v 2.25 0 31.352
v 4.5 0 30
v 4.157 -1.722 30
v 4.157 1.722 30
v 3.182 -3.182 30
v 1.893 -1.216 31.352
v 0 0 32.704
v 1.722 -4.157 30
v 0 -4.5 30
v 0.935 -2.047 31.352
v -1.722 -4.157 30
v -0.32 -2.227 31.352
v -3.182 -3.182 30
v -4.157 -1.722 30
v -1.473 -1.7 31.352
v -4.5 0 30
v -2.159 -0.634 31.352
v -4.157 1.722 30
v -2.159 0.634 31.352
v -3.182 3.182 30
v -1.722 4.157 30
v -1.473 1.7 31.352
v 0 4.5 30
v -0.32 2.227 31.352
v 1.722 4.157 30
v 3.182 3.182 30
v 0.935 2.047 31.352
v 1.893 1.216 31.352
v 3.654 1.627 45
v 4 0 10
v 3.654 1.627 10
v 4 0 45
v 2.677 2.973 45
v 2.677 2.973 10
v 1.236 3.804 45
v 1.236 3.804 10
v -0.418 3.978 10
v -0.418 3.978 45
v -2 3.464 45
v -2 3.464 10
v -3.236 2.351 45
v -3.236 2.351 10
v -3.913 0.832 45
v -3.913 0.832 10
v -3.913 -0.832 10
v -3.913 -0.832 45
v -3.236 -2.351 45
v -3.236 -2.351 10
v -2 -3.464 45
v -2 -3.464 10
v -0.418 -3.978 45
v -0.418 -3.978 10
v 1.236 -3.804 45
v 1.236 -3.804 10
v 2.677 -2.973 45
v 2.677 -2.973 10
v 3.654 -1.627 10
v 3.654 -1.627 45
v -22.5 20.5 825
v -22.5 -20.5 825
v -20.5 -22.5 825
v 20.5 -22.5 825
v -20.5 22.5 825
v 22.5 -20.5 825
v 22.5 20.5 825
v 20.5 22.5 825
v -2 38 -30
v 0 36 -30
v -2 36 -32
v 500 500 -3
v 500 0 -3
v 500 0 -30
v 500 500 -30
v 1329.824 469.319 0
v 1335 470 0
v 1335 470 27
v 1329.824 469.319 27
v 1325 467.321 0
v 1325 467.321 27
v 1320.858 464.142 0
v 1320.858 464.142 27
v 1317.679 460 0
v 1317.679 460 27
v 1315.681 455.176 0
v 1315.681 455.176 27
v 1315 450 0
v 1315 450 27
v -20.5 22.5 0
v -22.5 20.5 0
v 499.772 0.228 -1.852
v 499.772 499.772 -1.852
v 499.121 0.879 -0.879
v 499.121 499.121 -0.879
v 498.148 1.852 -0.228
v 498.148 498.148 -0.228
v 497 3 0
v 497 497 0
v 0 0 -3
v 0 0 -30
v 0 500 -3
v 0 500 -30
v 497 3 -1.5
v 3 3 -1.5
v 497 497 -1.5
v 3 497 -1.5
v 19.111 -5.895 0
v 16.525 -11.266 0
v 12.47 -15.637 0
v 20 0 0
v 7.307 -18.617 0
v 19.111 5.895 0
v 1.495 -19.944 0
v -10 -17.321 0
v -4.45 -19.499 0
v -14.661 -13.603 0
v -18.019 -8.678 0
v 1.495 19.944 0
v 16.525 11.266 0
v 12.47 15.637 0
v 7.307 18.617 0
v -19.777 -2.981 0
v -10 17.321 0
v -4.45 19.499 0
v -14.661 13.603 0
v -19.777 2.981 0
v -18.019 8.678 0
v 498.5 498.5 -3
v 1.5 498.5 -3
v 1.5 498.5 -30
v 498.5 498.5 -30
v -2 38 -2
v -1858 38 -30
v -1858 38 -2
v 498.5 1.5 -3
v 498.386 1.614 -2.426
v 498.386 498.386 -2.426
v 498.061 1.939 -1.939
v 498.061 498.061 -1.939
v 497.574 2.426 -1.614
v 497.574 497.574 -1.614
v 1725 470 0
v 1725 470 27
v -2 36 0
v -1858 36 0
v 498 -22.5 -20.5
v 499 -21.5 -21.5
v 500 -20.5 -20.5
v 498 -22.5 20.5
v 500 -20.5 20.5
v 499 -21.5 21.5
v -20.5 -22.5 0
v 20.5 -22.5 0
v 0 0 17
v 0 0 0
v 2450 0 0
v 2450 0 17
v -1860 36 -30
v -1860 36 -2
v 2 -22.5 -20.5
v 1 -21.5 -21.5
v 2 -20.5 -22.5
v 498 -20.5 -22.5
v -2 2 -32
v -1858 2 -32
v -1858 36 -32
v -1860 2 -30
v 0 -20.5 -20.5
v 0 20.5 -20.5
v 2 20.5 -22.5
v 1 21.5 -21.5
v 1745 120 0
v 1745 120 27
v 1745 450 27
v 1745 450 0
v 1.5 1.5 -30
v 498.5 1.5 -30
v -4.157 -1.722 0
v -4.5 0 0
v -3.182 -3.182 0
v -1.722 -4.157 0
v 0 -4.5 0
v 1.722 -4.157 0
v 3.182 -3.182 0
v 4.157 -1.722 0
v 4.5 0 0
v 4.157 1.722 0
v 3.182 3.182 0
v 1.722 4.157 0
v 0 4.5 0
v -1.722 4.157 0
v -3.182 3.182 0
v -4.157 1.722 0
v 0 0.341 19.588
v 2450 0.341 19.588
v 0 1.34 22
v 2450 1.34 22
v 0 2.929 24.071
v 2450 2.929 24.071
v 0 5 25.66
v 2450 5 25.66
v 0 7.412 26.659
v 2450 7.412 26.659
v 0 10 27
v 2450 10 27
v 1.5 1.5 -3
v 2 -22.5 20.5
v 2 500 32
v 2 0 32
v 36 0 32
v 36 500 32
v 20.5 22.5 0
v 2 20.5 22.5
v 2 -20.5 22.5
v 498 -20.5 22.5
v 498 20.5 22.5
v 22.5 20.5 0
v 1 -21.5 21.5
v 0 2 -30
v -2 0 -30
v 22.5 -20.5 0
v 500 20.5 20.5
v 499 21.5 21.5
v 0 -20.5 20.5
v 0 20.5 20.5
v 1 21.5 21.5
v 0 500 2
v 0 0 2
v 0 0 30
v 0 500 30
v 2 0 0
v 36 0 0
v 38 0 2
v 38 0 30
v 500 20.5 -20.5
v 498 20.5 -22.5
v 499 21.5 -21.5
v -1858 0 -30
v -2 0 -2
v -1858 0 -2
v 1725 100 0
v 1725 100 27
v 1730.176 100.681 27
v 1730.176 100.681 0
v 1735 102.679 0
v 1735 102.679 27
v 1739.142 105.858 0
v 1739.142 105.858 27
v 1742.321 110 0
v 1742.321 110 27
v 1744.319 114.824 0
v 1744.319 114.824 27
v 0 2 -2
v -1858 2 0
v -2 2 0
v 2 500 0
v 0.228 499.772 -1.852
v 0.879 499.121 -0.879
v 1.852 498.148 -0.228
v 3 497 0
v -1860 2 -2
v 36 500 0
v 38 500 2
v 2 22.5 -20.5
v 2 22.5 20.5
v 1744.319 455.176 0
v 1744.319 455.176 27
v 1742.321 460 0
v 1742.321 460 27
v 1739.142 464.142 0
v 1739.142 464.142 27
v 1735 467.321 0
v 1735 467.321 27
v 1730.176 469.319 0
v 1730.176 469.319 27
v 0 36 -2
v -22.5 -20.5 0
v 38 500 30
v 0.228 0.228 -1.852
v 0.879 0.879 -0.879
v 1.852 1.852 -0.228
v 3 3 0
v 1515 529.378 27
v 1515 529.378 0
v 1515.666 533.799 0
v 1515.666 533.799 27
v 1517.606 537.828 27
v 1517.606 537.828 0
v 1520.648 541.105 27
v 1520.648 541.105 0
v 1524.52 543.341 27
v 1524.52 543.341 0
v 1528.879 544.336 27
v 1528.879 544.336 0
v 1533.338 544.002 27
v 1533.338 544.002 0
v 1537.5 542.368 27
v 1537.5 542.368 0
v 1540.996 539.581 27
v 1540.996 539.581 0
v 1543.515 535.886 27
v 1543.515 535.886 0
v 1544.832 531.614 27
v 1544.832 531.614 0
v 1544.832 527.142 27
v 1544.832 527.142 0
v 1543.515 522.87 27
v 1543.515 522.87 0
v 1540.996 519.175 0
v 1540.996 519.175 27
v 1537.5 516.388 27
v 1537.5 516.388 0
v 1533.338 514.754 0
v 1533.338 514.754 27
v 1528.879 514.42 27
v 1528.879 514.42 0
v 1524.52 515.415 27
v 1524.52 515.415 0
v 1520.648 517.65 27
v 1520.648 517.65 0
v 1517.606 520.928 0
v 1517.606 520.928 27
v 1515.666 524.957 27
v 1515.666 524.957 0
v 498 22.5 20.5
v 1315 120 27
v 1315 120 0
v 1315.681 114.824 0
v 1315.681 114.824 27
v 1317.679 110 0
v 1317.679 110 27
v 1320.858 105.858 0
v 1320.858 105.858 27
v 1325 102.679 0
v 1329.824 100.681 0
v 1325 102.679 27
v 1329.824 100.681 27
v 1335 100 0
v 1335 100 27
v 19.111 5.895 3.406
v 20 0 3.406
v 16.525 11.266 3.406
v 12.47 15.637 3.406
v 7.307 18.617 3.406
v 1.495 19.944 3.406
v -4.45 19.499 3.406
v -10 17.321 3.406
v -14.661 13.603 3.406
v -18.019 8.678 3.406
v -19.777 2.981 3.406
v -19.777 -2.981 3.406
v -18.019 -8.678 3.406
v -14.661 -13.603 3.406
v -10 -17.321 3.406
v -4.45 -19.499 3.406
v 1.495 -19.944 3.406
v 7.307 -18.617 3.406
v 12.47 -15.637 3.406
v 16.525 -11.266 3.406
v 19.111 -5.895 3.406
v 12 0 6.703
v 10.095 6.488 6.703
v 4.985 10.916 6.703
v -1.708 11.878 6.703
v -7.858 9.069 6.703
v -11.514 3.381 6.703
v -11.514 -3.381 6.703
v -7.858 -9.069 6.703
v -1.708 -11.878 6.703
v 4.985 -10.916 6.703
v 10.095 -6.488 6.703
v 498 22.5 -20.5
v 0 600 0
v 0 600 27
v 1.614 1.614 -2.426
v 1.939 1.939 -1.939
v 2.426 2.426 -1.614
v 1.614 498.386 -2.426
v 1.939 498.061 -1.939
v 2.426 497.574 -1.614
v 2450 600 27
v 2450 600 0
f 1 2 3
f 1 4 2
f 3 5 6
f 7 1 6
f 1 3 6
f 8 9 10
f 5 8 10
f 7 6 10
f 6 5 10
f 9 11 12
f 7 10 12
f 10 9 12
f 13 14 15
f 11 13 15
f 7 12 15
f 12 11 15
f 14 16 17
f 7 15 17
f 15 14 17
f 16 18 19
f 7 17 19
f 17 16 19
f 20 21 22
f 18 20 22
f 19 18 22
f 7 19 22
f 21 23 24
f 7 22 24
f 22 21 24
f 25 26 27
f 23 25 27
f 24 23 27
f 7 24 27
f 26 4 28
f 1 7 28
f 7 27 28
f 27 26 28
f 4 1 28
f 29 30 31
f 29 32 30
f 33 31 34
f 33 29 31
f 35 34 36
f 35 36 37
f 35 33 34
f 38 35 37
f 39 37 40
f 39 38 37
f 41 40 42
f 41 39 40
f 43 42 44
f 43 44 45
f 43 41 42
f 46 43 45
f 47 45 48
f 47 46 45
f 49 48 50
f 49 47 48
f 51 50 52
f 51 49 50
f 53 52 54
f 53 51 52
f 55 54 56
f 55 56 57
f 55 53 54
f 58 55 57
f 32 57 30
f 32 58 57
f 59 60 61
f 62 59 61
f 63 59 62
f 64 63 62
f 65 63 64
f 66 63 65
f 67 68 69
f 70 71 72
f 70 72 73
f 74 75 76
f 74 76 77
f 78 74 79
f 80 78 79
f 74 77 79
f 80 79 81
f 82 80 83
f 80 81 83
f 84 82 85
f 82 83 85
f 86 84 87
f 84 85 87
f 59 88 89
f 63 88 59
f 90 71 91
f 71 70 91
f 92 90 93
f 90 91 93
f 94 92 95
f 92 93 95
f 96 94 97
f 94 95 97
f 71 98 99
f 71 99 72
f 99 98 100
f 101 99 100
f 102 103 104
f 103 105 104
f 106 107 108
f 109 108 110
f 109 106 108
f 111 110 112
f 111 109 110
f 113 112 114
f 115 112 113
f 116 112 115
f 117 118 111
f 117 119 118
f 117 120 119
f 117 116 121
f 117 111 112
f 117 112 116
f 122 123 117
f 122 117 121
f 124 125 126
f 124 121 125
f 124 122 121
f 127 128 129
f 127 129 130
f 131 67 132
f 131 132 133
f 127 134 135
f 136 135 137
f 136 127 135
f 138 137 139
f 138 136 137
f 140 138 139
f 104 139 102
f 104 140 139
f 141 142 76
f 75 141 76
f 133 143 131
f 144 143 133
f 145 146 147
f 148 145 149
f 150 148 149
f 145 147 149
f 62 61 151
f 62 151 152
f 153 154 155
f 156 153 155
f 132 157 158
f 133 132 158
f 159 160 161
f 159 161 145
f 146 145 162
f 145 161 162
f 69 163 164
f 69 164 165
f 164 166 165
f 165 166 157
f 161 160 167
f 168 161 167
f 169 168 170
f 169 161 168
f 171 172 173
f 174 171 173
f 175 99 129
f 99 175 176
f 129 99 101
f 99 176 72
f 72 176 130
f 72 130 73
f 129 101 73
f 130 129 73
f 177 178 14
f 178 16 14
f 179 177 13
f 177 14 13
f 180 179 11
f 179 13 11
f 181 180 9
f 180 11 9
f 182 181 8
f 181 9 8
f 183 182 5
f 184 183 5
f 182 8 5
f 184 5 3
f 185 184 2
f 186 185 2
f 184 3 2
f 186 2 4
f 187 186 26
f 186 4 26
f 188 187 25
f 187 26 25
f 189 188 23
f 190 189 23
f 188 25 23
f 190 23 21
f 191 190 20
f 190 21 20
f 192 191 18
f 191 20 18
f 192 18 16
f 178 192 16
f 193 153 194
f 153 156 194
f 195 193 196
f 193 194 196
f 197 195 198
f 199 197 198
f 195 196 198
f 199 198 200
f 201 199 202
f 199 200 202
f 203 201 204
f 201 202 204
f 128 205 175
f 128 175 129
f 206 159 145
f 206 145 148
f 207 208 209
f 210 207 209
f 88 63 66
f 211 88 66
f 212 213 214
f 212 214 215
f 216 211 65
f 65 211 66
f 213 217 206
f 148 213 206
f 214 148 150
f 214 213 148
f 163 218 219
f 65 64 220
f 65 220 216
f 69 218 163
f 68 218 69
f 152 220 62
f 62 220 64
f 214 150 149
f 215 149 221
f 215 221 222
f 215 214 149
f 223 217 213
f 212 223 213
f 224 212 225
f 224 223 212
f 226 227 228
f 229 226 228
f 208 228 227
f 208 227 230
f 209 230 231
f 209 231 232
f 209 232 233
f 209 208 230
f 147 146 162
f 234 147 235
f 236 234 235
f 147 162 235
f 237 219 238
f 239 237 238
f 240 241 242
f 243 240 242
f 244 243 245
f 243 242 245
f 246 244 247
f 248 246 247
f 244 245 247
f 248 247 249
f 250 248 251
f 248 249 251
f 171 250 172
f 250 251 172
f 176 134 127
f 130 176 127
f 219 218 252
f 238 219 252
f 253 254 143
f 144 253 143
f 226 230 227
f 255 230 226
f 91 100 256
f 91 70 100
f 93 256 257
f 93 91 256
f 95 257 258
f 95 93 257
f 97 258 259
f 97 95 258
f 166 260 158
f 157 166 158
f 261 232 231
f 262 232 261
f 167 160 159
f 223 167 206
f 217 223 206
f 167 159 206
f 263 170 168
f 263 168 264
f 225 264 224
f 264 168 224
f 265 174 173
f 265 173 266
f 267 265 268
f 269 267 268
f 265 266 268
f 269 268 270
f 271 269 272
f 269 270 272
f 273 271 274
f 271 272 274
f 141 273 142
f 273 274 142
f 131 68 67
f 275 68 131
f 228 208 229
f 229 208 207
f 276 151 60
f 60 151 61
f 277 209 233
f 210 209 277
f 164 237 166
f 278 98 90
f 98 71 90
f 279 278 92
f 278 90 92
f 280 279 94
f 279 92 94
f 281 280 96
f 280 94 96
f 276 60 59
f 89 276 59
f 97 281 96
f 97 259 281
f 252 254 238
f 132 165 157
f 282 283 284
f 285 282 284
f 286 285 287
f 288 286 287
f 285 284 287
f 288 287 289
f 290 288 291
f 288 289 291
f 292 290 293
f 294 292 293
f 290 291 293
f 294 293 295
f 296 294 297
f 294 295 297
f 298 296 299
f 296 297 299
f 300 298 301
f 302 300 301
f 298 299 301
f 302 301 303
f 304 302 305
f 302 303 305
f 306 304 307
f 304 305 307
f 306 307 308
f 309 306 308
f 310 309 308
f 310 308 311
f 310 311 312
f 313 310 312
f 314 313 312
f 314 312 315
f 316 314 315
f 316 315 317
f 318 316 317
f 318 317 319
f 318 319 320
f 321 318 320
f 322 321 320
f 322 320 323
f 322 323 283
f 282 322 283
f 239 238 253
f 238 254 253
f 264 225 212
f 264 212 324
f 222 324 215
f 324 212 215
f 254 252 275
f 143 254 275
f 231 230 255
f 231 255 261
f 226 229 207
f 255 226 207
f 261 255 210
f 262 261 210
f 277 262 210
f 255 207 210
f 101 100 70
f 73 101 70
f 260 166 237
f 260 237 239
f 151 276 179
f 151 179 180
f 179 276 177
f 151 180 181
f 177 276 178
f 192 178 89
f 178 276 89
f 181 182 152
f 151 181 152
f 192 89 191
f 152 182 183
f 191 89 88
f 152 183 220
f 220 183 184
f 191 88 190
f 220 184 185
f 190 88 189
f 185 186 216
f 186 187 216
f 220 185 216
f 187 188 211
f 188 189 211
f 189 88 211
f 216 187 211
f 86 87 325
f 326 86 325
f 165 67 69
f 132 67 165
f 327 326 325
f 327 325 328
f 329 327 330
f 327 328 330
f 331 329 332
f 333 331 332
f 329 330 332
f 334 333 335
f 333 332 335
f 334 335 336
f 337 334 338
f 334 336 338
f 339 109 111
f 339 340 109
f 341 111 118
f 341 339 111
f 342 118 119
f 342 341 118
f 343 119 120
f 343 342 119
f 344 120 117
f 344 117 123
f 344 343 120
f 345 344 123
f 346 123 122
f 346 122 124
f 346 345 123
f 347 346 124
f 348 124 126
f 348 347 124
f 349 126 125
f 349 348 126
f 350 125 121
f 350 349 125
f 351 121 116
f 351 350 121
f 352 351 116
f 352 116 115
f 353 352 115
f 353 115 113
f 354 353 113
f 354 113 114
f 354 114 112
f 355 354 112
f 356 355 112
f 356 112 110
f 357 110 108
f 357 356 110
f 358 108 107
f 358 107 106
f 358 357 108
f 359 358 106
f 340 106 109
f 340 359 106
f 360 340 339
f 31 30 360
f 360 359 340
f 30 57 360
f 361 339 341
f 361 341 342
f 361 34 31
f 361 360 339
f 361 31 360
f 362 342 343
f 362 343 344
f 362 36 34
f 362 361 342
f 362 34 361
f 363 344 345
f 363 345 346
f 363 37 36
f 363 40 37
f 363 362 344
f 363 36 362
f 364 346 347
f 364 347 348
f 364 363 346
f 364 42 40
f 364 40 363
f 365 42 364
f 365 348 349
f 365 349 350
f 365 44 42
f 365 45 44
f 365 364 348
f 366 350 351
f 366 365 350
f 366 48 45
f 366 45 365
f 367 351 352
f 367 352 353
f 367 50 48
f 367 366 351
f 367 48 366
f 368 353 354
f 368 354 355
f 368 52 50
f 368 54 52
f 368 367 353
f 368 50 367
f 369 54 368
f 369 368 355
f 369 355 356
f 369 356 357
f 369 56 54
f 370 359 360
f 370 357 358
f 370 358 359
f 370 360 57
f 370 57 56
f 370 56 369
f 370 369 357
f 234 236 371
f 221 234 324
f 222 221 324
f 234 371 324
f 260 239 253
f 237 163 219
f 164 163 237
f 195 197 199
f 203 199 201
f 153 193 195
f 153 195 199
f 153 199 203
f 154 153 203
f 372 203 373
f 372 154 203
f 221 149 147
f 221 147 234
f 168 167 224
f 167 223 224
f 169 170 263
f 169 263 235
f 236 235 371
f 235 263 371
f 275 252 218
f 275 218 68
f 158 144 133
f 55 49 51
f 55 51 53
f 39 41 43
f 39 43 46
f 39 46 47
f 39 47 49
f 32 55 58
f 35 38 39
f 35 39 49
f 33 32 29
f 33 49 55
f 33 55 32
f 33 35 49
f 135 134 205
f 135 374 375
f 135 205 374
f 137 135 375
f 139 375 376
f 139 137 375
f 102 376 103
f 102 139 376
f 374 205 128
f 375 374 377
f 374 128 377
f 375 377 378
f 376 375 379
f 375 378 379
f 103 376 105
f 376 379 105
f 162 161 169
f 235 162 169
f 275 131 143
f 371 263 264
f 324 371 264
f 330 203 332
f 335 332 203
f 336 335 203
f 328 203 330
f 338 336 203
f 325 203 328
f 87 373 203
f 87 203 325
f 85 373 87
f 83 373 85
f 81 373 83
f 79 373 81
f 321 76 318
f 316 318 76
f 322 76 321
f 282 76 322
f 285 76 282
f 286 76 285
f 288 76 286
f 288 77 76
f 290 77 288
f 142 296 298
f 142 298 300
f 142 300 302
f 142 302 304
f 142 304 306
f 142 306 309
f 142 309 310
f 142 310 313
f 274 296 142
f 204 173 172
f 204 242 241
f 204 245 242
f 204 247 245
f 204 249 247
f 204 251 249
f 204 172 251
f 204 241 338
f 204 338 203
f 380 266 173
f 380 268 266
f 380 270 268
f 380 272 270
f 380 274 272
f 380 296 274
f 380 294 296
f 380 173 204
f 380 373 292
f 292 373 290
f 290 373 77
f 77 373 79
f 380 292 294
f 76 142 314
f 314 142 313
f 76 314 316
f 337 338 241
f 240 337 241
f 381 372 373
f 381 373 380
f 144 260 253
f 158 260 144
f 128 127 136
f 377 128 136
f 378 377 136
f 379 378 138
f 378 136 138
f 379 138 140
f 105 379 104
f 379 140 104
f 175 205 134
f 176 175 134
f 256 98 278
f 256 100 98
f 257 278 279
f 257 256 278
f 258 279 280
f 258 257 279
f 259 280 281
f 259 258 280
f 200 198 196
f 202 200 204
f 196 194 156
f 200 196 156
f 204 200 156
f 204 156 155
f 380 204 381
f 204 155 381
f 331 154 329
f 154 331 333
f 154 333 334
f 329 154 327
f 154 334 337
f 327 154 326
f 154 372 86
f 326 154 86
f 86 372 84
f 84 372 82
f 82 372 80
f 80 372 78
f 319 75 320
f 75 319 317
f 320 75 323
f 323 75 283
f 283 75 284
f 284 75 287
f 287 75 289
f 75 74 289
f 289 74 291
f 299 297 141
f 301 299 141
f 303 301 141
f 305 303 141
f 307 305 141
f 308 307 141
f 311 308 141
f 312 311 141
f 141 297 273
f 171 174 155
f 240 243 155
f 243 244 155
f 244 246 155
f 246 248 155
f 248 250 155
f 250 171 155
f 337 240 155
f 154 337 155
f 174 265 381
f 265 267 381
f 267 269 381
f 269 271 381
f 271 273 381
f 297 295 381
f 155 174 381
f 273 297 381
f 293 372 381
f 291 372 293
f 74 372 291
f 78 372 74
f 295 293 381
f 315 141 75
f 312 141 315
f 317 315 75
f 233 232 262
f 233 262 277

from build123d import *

# Parameters (mm, degrees)
F0_W      = 45
F0_H      = 45
F1_DEPTH  = 825
F2_W      = 45
F2_H      = 45
F3_DEPTH  = 500
F4_W      = 2450
F4_H      = 600
F5_DEPTH  = 27
F6_R      = 10
F7_SIZE   = 2
F8_SIZE   = 2
F9_SIZE   = 2
F10_W     = 38
F10_H     = 32
F11_DEPTH = 500
F12_SIZE  = 2
F14_D     = 9
F14_DEPTH = 30
F14_TIP   = 2.7038727856
F18_DEPTH = 49.501
F20_D     = 30
F21_W     = 38
F21_H     = 32
F22_DEPTH = 1860
F23_SIZE  = 2
F24_W     = 500
F24_H     = 500
F25_DEPTH = 30
F26_R     = 3
F27_T     = -1.5


with BuildPart() as f1:
    # F0 (on Top) → F1 (new body)
    with BuildSketch(Plane.XY):
        Rectangle(F0_W, F0_H)
    extrude(amount=F1_DEPTH)

    # F7
    f7_edges = [f1.edges().sort_by_distance(p)[0] for p in [
        (22.5, -22.5, 412.5),
        (22.5, 22.5, 412.5),
        (-22.5, -22.5, 412.5),
        (-22.5, 22.5, 412.5),
    ]]
    chamfer(f7_edges, length=F7_SIZE)

    # F14
    with Locations(Plane(origin=(0, 0, 0), x_dir=(1, 0, 0), z_dir=(0, 0, -1))):
        with Locations((0, 0)):
            Hole(F14_D / 2, depth=F14_DEPTH)
            with Locations((0, 0, -(F14_DEPTH + F14_TIP / 2))):  # 118° drill point
                Cone(0, F14_D / 2, F14_TIP, mode=Mode.SUBTRACT)


with BuildPart() as f3:
    # F2 (on Right) → F3 (new body)
    with BuildSketch(Plane.YZ):
        Rectangle(F2_W, F2_H)
    extrude(amount=F3_DEPTH)

    # F8
    f8_edges = [f3.edges().sort_by_distance(p)[0] for p in [
        (250, -22.5, 22.5),
        (250, 22.5, 22.5),
        (250, -22.5, -22.5),
        (250, 22.5, -22.5),
    ]]
    chamfer(f8_edges, length=F8_SIZE)

    # F9 (call 1 of 8: OpenCascade refuses the feature's edges together)
    f9_edges = [f3.edges().sort_by_distance(p)[0] for p in [
        (500, -22.5, 0),
    ]]
    chamfer(f9_edges, length=F9_SIZE)

    # F9#2 (call 2 of 8)
    f9_2_edges = [f3.edges().sort_by_distance(p)[0] for p in [
        (500, 0, 22.5),
    ]]
    chamfer(f9_2_edges, length=F9_SIZE)

    # F9#3 (call 3 of 8)
    f9_3_edges = [f3.edges().sort_by_distance(p)[0] for p in [
        (500, 22.5, 0),
    ]]
    chamfer(f9_3_edges, length=F9_SIZE)

    # F9#4 (call 4 of 8)
    f9_4_edges = [f3.edges().sort_by_distance(p)[0] for p in [
        (500, 0, -22.5),
    ]]
    chamfer(f9_4_edges, length=F9_SIZE)

    # F9#5 (call 5 of 8)
    f9_5_edges = [f3.edges().sort_by_distance(p)[0] for p in [
        (0, 0, 22.5),
    ]]
    chamfer(f9_5_edges, length=F9_SIZE)

    # F9#6 (call 6 of 8)
    f9_6_edges = [f3.edges().sort_by_distance(p)[0] for p in [
        (0, 22.5, 0),
    ]]
    chamfer(f9_6_edges, length=F9_SIZE)

    # F9#7 (call 7 of 8)
    f9_7_edges = [f3.edges().sort_by_distance(p)[0] for p in [
        (0, 0, -22.5),
    ]]
    chamfer(f9_7_edges, length=F9_SIZE)

    # F9#8 (call 8 of 8)
    f9_8_edges = [f3.edges().sort_by_distance(p)[0] for p in [
        (0, -22.5, 0),
    ]]
    chamfer(f9_8_edges, length=F9_SIZE)


with BuildPart() as f5:
    # F4 (on Top) → F5 (new body)
    with BuildSketch(Plane.XY):
        with Locations((1225, 300)):
            Rectangle(F4_W, F4_H)
    extrude(amount=F5_DEPTH)

    # F6
    f6_edges = [f5.edges().sort_by_distance(p)[0] for p in [
        (1225, 0, 27),
    ]]
    fillet(f6_edges, radius=F6_R)

    # F17 (on face) → F18 (cut, through all)
    with BuildSketch(Plane.XY.offset(27)):
        with BuildLine():
            Line((1725, 470), (1335, 470))
            ThreePointArc((1335, 470), (1320.8578643763, 464.1421356237), (1315, 450))
            Line((1315, 450), (1315, 120))
            ThreePointArc((1315, 120), (1320.8578643763, 105.8578643763), (1335, 100))
            Line((1335, 100), (1725, 100))
            ThreePointArc((1725, 100), (1739.1421356237, 105.8578643763), (1745, 120))
            Line((1745, 120), (1745, 450))
            ThreePointArc((1745, 450), (1739.1421356237, 464.1421356237), (1725, 470))
        make_face()
    extrude(amount=-F18_DEPTH, mode=Mode.SUBTRACT)

    # F20 (through all)
    with Locations(Plane.XY.offset(27)):
        with Locations((1530, 529.3779373169)):
            Hole(F20_D / 2)


with BuildPart() as f11:
    # F10 (on Front) → F11 (new body)
    with BuildSketch(Plane.XZ):
        with Locations((19, 16)):
            Rectangle(F10_W, F10_H)
    extrude(amount=-F11_DEPTH)

    # F12
    f12_edges = [f11.edges().sort_by_distance(p)[0] for p in [
        (0, 250, 32),
        (38, 250, 32),
        (0, 250, 0),
        (38, 250, 0),
    ]]
    chamfer(f12_edges, length=F12_SIZE)


with BuildPart() as f16:
    # F15 (on Front) → F16 (revolve)
    with BuildSketch(Plane.XZ):
        Polygon((4, 45), (0, 45), (0, 0), (20, 0), (20, 3.4055154375), (4, 10), align=None)
    revolve(axis=Axis((0, 0, 22.5), (0, 0, 1)))


with BuildPart() as f22:
    # F21 (on Right) → F22 (new body)
    with BuildSketch(Plane.YZ):
        with Locations((19, -16)):
            Rectangle(F21_W, F21_H)
    extrude(amount=-F22_DEPTH)

    # F23
    f23_edges = [f22.edges().sort_by_distance(p)[0] for p in [
        (-930, 0, 0),
        (-930, 38, 0),
        (0, 38, -16),
        (0, 19, -32),
        (0, 19, 0),
        (0, 0, -16),
        (-930, 0, -32),
        (-930, 38, -32),
        (-1860, 0, -16),
        (-1860, 19, -32),
        (-1860, 19, 0),
        (-1860, 38, -16),
    ]]
    chamfer(f23_edges, length=F23_SIZE)


with BuildPart() as f25:
    # F24 (on Top) → F25 (new body)
    with BuildSketch(Plane.XY):
        with Locations((250, 250)):
            Rectangle(F24_W, F24_H)
    extrude(amount=-F25_DEPTH)

    # F26
    f26_edges = [f25.edges().sort_by_distance(p)[0] for p in [
        (250, 0, 0),
        (500, 250, 0),
        (250, 500, 0),
        (0, 250, 0),
    ]]
    fillet(f26_edges, radius=F26_R)

    # F27
    f27_openings = [f25.faces().sort_by_distance(p)[0] for p in [
        (250, 250, -30),
    ]]
    offset(amount=F27_T, openings=f27_openings)


solid = Compound([f1.part, f3.part, f5.part, f11.part, f16.part, f22.part, f25.part])
